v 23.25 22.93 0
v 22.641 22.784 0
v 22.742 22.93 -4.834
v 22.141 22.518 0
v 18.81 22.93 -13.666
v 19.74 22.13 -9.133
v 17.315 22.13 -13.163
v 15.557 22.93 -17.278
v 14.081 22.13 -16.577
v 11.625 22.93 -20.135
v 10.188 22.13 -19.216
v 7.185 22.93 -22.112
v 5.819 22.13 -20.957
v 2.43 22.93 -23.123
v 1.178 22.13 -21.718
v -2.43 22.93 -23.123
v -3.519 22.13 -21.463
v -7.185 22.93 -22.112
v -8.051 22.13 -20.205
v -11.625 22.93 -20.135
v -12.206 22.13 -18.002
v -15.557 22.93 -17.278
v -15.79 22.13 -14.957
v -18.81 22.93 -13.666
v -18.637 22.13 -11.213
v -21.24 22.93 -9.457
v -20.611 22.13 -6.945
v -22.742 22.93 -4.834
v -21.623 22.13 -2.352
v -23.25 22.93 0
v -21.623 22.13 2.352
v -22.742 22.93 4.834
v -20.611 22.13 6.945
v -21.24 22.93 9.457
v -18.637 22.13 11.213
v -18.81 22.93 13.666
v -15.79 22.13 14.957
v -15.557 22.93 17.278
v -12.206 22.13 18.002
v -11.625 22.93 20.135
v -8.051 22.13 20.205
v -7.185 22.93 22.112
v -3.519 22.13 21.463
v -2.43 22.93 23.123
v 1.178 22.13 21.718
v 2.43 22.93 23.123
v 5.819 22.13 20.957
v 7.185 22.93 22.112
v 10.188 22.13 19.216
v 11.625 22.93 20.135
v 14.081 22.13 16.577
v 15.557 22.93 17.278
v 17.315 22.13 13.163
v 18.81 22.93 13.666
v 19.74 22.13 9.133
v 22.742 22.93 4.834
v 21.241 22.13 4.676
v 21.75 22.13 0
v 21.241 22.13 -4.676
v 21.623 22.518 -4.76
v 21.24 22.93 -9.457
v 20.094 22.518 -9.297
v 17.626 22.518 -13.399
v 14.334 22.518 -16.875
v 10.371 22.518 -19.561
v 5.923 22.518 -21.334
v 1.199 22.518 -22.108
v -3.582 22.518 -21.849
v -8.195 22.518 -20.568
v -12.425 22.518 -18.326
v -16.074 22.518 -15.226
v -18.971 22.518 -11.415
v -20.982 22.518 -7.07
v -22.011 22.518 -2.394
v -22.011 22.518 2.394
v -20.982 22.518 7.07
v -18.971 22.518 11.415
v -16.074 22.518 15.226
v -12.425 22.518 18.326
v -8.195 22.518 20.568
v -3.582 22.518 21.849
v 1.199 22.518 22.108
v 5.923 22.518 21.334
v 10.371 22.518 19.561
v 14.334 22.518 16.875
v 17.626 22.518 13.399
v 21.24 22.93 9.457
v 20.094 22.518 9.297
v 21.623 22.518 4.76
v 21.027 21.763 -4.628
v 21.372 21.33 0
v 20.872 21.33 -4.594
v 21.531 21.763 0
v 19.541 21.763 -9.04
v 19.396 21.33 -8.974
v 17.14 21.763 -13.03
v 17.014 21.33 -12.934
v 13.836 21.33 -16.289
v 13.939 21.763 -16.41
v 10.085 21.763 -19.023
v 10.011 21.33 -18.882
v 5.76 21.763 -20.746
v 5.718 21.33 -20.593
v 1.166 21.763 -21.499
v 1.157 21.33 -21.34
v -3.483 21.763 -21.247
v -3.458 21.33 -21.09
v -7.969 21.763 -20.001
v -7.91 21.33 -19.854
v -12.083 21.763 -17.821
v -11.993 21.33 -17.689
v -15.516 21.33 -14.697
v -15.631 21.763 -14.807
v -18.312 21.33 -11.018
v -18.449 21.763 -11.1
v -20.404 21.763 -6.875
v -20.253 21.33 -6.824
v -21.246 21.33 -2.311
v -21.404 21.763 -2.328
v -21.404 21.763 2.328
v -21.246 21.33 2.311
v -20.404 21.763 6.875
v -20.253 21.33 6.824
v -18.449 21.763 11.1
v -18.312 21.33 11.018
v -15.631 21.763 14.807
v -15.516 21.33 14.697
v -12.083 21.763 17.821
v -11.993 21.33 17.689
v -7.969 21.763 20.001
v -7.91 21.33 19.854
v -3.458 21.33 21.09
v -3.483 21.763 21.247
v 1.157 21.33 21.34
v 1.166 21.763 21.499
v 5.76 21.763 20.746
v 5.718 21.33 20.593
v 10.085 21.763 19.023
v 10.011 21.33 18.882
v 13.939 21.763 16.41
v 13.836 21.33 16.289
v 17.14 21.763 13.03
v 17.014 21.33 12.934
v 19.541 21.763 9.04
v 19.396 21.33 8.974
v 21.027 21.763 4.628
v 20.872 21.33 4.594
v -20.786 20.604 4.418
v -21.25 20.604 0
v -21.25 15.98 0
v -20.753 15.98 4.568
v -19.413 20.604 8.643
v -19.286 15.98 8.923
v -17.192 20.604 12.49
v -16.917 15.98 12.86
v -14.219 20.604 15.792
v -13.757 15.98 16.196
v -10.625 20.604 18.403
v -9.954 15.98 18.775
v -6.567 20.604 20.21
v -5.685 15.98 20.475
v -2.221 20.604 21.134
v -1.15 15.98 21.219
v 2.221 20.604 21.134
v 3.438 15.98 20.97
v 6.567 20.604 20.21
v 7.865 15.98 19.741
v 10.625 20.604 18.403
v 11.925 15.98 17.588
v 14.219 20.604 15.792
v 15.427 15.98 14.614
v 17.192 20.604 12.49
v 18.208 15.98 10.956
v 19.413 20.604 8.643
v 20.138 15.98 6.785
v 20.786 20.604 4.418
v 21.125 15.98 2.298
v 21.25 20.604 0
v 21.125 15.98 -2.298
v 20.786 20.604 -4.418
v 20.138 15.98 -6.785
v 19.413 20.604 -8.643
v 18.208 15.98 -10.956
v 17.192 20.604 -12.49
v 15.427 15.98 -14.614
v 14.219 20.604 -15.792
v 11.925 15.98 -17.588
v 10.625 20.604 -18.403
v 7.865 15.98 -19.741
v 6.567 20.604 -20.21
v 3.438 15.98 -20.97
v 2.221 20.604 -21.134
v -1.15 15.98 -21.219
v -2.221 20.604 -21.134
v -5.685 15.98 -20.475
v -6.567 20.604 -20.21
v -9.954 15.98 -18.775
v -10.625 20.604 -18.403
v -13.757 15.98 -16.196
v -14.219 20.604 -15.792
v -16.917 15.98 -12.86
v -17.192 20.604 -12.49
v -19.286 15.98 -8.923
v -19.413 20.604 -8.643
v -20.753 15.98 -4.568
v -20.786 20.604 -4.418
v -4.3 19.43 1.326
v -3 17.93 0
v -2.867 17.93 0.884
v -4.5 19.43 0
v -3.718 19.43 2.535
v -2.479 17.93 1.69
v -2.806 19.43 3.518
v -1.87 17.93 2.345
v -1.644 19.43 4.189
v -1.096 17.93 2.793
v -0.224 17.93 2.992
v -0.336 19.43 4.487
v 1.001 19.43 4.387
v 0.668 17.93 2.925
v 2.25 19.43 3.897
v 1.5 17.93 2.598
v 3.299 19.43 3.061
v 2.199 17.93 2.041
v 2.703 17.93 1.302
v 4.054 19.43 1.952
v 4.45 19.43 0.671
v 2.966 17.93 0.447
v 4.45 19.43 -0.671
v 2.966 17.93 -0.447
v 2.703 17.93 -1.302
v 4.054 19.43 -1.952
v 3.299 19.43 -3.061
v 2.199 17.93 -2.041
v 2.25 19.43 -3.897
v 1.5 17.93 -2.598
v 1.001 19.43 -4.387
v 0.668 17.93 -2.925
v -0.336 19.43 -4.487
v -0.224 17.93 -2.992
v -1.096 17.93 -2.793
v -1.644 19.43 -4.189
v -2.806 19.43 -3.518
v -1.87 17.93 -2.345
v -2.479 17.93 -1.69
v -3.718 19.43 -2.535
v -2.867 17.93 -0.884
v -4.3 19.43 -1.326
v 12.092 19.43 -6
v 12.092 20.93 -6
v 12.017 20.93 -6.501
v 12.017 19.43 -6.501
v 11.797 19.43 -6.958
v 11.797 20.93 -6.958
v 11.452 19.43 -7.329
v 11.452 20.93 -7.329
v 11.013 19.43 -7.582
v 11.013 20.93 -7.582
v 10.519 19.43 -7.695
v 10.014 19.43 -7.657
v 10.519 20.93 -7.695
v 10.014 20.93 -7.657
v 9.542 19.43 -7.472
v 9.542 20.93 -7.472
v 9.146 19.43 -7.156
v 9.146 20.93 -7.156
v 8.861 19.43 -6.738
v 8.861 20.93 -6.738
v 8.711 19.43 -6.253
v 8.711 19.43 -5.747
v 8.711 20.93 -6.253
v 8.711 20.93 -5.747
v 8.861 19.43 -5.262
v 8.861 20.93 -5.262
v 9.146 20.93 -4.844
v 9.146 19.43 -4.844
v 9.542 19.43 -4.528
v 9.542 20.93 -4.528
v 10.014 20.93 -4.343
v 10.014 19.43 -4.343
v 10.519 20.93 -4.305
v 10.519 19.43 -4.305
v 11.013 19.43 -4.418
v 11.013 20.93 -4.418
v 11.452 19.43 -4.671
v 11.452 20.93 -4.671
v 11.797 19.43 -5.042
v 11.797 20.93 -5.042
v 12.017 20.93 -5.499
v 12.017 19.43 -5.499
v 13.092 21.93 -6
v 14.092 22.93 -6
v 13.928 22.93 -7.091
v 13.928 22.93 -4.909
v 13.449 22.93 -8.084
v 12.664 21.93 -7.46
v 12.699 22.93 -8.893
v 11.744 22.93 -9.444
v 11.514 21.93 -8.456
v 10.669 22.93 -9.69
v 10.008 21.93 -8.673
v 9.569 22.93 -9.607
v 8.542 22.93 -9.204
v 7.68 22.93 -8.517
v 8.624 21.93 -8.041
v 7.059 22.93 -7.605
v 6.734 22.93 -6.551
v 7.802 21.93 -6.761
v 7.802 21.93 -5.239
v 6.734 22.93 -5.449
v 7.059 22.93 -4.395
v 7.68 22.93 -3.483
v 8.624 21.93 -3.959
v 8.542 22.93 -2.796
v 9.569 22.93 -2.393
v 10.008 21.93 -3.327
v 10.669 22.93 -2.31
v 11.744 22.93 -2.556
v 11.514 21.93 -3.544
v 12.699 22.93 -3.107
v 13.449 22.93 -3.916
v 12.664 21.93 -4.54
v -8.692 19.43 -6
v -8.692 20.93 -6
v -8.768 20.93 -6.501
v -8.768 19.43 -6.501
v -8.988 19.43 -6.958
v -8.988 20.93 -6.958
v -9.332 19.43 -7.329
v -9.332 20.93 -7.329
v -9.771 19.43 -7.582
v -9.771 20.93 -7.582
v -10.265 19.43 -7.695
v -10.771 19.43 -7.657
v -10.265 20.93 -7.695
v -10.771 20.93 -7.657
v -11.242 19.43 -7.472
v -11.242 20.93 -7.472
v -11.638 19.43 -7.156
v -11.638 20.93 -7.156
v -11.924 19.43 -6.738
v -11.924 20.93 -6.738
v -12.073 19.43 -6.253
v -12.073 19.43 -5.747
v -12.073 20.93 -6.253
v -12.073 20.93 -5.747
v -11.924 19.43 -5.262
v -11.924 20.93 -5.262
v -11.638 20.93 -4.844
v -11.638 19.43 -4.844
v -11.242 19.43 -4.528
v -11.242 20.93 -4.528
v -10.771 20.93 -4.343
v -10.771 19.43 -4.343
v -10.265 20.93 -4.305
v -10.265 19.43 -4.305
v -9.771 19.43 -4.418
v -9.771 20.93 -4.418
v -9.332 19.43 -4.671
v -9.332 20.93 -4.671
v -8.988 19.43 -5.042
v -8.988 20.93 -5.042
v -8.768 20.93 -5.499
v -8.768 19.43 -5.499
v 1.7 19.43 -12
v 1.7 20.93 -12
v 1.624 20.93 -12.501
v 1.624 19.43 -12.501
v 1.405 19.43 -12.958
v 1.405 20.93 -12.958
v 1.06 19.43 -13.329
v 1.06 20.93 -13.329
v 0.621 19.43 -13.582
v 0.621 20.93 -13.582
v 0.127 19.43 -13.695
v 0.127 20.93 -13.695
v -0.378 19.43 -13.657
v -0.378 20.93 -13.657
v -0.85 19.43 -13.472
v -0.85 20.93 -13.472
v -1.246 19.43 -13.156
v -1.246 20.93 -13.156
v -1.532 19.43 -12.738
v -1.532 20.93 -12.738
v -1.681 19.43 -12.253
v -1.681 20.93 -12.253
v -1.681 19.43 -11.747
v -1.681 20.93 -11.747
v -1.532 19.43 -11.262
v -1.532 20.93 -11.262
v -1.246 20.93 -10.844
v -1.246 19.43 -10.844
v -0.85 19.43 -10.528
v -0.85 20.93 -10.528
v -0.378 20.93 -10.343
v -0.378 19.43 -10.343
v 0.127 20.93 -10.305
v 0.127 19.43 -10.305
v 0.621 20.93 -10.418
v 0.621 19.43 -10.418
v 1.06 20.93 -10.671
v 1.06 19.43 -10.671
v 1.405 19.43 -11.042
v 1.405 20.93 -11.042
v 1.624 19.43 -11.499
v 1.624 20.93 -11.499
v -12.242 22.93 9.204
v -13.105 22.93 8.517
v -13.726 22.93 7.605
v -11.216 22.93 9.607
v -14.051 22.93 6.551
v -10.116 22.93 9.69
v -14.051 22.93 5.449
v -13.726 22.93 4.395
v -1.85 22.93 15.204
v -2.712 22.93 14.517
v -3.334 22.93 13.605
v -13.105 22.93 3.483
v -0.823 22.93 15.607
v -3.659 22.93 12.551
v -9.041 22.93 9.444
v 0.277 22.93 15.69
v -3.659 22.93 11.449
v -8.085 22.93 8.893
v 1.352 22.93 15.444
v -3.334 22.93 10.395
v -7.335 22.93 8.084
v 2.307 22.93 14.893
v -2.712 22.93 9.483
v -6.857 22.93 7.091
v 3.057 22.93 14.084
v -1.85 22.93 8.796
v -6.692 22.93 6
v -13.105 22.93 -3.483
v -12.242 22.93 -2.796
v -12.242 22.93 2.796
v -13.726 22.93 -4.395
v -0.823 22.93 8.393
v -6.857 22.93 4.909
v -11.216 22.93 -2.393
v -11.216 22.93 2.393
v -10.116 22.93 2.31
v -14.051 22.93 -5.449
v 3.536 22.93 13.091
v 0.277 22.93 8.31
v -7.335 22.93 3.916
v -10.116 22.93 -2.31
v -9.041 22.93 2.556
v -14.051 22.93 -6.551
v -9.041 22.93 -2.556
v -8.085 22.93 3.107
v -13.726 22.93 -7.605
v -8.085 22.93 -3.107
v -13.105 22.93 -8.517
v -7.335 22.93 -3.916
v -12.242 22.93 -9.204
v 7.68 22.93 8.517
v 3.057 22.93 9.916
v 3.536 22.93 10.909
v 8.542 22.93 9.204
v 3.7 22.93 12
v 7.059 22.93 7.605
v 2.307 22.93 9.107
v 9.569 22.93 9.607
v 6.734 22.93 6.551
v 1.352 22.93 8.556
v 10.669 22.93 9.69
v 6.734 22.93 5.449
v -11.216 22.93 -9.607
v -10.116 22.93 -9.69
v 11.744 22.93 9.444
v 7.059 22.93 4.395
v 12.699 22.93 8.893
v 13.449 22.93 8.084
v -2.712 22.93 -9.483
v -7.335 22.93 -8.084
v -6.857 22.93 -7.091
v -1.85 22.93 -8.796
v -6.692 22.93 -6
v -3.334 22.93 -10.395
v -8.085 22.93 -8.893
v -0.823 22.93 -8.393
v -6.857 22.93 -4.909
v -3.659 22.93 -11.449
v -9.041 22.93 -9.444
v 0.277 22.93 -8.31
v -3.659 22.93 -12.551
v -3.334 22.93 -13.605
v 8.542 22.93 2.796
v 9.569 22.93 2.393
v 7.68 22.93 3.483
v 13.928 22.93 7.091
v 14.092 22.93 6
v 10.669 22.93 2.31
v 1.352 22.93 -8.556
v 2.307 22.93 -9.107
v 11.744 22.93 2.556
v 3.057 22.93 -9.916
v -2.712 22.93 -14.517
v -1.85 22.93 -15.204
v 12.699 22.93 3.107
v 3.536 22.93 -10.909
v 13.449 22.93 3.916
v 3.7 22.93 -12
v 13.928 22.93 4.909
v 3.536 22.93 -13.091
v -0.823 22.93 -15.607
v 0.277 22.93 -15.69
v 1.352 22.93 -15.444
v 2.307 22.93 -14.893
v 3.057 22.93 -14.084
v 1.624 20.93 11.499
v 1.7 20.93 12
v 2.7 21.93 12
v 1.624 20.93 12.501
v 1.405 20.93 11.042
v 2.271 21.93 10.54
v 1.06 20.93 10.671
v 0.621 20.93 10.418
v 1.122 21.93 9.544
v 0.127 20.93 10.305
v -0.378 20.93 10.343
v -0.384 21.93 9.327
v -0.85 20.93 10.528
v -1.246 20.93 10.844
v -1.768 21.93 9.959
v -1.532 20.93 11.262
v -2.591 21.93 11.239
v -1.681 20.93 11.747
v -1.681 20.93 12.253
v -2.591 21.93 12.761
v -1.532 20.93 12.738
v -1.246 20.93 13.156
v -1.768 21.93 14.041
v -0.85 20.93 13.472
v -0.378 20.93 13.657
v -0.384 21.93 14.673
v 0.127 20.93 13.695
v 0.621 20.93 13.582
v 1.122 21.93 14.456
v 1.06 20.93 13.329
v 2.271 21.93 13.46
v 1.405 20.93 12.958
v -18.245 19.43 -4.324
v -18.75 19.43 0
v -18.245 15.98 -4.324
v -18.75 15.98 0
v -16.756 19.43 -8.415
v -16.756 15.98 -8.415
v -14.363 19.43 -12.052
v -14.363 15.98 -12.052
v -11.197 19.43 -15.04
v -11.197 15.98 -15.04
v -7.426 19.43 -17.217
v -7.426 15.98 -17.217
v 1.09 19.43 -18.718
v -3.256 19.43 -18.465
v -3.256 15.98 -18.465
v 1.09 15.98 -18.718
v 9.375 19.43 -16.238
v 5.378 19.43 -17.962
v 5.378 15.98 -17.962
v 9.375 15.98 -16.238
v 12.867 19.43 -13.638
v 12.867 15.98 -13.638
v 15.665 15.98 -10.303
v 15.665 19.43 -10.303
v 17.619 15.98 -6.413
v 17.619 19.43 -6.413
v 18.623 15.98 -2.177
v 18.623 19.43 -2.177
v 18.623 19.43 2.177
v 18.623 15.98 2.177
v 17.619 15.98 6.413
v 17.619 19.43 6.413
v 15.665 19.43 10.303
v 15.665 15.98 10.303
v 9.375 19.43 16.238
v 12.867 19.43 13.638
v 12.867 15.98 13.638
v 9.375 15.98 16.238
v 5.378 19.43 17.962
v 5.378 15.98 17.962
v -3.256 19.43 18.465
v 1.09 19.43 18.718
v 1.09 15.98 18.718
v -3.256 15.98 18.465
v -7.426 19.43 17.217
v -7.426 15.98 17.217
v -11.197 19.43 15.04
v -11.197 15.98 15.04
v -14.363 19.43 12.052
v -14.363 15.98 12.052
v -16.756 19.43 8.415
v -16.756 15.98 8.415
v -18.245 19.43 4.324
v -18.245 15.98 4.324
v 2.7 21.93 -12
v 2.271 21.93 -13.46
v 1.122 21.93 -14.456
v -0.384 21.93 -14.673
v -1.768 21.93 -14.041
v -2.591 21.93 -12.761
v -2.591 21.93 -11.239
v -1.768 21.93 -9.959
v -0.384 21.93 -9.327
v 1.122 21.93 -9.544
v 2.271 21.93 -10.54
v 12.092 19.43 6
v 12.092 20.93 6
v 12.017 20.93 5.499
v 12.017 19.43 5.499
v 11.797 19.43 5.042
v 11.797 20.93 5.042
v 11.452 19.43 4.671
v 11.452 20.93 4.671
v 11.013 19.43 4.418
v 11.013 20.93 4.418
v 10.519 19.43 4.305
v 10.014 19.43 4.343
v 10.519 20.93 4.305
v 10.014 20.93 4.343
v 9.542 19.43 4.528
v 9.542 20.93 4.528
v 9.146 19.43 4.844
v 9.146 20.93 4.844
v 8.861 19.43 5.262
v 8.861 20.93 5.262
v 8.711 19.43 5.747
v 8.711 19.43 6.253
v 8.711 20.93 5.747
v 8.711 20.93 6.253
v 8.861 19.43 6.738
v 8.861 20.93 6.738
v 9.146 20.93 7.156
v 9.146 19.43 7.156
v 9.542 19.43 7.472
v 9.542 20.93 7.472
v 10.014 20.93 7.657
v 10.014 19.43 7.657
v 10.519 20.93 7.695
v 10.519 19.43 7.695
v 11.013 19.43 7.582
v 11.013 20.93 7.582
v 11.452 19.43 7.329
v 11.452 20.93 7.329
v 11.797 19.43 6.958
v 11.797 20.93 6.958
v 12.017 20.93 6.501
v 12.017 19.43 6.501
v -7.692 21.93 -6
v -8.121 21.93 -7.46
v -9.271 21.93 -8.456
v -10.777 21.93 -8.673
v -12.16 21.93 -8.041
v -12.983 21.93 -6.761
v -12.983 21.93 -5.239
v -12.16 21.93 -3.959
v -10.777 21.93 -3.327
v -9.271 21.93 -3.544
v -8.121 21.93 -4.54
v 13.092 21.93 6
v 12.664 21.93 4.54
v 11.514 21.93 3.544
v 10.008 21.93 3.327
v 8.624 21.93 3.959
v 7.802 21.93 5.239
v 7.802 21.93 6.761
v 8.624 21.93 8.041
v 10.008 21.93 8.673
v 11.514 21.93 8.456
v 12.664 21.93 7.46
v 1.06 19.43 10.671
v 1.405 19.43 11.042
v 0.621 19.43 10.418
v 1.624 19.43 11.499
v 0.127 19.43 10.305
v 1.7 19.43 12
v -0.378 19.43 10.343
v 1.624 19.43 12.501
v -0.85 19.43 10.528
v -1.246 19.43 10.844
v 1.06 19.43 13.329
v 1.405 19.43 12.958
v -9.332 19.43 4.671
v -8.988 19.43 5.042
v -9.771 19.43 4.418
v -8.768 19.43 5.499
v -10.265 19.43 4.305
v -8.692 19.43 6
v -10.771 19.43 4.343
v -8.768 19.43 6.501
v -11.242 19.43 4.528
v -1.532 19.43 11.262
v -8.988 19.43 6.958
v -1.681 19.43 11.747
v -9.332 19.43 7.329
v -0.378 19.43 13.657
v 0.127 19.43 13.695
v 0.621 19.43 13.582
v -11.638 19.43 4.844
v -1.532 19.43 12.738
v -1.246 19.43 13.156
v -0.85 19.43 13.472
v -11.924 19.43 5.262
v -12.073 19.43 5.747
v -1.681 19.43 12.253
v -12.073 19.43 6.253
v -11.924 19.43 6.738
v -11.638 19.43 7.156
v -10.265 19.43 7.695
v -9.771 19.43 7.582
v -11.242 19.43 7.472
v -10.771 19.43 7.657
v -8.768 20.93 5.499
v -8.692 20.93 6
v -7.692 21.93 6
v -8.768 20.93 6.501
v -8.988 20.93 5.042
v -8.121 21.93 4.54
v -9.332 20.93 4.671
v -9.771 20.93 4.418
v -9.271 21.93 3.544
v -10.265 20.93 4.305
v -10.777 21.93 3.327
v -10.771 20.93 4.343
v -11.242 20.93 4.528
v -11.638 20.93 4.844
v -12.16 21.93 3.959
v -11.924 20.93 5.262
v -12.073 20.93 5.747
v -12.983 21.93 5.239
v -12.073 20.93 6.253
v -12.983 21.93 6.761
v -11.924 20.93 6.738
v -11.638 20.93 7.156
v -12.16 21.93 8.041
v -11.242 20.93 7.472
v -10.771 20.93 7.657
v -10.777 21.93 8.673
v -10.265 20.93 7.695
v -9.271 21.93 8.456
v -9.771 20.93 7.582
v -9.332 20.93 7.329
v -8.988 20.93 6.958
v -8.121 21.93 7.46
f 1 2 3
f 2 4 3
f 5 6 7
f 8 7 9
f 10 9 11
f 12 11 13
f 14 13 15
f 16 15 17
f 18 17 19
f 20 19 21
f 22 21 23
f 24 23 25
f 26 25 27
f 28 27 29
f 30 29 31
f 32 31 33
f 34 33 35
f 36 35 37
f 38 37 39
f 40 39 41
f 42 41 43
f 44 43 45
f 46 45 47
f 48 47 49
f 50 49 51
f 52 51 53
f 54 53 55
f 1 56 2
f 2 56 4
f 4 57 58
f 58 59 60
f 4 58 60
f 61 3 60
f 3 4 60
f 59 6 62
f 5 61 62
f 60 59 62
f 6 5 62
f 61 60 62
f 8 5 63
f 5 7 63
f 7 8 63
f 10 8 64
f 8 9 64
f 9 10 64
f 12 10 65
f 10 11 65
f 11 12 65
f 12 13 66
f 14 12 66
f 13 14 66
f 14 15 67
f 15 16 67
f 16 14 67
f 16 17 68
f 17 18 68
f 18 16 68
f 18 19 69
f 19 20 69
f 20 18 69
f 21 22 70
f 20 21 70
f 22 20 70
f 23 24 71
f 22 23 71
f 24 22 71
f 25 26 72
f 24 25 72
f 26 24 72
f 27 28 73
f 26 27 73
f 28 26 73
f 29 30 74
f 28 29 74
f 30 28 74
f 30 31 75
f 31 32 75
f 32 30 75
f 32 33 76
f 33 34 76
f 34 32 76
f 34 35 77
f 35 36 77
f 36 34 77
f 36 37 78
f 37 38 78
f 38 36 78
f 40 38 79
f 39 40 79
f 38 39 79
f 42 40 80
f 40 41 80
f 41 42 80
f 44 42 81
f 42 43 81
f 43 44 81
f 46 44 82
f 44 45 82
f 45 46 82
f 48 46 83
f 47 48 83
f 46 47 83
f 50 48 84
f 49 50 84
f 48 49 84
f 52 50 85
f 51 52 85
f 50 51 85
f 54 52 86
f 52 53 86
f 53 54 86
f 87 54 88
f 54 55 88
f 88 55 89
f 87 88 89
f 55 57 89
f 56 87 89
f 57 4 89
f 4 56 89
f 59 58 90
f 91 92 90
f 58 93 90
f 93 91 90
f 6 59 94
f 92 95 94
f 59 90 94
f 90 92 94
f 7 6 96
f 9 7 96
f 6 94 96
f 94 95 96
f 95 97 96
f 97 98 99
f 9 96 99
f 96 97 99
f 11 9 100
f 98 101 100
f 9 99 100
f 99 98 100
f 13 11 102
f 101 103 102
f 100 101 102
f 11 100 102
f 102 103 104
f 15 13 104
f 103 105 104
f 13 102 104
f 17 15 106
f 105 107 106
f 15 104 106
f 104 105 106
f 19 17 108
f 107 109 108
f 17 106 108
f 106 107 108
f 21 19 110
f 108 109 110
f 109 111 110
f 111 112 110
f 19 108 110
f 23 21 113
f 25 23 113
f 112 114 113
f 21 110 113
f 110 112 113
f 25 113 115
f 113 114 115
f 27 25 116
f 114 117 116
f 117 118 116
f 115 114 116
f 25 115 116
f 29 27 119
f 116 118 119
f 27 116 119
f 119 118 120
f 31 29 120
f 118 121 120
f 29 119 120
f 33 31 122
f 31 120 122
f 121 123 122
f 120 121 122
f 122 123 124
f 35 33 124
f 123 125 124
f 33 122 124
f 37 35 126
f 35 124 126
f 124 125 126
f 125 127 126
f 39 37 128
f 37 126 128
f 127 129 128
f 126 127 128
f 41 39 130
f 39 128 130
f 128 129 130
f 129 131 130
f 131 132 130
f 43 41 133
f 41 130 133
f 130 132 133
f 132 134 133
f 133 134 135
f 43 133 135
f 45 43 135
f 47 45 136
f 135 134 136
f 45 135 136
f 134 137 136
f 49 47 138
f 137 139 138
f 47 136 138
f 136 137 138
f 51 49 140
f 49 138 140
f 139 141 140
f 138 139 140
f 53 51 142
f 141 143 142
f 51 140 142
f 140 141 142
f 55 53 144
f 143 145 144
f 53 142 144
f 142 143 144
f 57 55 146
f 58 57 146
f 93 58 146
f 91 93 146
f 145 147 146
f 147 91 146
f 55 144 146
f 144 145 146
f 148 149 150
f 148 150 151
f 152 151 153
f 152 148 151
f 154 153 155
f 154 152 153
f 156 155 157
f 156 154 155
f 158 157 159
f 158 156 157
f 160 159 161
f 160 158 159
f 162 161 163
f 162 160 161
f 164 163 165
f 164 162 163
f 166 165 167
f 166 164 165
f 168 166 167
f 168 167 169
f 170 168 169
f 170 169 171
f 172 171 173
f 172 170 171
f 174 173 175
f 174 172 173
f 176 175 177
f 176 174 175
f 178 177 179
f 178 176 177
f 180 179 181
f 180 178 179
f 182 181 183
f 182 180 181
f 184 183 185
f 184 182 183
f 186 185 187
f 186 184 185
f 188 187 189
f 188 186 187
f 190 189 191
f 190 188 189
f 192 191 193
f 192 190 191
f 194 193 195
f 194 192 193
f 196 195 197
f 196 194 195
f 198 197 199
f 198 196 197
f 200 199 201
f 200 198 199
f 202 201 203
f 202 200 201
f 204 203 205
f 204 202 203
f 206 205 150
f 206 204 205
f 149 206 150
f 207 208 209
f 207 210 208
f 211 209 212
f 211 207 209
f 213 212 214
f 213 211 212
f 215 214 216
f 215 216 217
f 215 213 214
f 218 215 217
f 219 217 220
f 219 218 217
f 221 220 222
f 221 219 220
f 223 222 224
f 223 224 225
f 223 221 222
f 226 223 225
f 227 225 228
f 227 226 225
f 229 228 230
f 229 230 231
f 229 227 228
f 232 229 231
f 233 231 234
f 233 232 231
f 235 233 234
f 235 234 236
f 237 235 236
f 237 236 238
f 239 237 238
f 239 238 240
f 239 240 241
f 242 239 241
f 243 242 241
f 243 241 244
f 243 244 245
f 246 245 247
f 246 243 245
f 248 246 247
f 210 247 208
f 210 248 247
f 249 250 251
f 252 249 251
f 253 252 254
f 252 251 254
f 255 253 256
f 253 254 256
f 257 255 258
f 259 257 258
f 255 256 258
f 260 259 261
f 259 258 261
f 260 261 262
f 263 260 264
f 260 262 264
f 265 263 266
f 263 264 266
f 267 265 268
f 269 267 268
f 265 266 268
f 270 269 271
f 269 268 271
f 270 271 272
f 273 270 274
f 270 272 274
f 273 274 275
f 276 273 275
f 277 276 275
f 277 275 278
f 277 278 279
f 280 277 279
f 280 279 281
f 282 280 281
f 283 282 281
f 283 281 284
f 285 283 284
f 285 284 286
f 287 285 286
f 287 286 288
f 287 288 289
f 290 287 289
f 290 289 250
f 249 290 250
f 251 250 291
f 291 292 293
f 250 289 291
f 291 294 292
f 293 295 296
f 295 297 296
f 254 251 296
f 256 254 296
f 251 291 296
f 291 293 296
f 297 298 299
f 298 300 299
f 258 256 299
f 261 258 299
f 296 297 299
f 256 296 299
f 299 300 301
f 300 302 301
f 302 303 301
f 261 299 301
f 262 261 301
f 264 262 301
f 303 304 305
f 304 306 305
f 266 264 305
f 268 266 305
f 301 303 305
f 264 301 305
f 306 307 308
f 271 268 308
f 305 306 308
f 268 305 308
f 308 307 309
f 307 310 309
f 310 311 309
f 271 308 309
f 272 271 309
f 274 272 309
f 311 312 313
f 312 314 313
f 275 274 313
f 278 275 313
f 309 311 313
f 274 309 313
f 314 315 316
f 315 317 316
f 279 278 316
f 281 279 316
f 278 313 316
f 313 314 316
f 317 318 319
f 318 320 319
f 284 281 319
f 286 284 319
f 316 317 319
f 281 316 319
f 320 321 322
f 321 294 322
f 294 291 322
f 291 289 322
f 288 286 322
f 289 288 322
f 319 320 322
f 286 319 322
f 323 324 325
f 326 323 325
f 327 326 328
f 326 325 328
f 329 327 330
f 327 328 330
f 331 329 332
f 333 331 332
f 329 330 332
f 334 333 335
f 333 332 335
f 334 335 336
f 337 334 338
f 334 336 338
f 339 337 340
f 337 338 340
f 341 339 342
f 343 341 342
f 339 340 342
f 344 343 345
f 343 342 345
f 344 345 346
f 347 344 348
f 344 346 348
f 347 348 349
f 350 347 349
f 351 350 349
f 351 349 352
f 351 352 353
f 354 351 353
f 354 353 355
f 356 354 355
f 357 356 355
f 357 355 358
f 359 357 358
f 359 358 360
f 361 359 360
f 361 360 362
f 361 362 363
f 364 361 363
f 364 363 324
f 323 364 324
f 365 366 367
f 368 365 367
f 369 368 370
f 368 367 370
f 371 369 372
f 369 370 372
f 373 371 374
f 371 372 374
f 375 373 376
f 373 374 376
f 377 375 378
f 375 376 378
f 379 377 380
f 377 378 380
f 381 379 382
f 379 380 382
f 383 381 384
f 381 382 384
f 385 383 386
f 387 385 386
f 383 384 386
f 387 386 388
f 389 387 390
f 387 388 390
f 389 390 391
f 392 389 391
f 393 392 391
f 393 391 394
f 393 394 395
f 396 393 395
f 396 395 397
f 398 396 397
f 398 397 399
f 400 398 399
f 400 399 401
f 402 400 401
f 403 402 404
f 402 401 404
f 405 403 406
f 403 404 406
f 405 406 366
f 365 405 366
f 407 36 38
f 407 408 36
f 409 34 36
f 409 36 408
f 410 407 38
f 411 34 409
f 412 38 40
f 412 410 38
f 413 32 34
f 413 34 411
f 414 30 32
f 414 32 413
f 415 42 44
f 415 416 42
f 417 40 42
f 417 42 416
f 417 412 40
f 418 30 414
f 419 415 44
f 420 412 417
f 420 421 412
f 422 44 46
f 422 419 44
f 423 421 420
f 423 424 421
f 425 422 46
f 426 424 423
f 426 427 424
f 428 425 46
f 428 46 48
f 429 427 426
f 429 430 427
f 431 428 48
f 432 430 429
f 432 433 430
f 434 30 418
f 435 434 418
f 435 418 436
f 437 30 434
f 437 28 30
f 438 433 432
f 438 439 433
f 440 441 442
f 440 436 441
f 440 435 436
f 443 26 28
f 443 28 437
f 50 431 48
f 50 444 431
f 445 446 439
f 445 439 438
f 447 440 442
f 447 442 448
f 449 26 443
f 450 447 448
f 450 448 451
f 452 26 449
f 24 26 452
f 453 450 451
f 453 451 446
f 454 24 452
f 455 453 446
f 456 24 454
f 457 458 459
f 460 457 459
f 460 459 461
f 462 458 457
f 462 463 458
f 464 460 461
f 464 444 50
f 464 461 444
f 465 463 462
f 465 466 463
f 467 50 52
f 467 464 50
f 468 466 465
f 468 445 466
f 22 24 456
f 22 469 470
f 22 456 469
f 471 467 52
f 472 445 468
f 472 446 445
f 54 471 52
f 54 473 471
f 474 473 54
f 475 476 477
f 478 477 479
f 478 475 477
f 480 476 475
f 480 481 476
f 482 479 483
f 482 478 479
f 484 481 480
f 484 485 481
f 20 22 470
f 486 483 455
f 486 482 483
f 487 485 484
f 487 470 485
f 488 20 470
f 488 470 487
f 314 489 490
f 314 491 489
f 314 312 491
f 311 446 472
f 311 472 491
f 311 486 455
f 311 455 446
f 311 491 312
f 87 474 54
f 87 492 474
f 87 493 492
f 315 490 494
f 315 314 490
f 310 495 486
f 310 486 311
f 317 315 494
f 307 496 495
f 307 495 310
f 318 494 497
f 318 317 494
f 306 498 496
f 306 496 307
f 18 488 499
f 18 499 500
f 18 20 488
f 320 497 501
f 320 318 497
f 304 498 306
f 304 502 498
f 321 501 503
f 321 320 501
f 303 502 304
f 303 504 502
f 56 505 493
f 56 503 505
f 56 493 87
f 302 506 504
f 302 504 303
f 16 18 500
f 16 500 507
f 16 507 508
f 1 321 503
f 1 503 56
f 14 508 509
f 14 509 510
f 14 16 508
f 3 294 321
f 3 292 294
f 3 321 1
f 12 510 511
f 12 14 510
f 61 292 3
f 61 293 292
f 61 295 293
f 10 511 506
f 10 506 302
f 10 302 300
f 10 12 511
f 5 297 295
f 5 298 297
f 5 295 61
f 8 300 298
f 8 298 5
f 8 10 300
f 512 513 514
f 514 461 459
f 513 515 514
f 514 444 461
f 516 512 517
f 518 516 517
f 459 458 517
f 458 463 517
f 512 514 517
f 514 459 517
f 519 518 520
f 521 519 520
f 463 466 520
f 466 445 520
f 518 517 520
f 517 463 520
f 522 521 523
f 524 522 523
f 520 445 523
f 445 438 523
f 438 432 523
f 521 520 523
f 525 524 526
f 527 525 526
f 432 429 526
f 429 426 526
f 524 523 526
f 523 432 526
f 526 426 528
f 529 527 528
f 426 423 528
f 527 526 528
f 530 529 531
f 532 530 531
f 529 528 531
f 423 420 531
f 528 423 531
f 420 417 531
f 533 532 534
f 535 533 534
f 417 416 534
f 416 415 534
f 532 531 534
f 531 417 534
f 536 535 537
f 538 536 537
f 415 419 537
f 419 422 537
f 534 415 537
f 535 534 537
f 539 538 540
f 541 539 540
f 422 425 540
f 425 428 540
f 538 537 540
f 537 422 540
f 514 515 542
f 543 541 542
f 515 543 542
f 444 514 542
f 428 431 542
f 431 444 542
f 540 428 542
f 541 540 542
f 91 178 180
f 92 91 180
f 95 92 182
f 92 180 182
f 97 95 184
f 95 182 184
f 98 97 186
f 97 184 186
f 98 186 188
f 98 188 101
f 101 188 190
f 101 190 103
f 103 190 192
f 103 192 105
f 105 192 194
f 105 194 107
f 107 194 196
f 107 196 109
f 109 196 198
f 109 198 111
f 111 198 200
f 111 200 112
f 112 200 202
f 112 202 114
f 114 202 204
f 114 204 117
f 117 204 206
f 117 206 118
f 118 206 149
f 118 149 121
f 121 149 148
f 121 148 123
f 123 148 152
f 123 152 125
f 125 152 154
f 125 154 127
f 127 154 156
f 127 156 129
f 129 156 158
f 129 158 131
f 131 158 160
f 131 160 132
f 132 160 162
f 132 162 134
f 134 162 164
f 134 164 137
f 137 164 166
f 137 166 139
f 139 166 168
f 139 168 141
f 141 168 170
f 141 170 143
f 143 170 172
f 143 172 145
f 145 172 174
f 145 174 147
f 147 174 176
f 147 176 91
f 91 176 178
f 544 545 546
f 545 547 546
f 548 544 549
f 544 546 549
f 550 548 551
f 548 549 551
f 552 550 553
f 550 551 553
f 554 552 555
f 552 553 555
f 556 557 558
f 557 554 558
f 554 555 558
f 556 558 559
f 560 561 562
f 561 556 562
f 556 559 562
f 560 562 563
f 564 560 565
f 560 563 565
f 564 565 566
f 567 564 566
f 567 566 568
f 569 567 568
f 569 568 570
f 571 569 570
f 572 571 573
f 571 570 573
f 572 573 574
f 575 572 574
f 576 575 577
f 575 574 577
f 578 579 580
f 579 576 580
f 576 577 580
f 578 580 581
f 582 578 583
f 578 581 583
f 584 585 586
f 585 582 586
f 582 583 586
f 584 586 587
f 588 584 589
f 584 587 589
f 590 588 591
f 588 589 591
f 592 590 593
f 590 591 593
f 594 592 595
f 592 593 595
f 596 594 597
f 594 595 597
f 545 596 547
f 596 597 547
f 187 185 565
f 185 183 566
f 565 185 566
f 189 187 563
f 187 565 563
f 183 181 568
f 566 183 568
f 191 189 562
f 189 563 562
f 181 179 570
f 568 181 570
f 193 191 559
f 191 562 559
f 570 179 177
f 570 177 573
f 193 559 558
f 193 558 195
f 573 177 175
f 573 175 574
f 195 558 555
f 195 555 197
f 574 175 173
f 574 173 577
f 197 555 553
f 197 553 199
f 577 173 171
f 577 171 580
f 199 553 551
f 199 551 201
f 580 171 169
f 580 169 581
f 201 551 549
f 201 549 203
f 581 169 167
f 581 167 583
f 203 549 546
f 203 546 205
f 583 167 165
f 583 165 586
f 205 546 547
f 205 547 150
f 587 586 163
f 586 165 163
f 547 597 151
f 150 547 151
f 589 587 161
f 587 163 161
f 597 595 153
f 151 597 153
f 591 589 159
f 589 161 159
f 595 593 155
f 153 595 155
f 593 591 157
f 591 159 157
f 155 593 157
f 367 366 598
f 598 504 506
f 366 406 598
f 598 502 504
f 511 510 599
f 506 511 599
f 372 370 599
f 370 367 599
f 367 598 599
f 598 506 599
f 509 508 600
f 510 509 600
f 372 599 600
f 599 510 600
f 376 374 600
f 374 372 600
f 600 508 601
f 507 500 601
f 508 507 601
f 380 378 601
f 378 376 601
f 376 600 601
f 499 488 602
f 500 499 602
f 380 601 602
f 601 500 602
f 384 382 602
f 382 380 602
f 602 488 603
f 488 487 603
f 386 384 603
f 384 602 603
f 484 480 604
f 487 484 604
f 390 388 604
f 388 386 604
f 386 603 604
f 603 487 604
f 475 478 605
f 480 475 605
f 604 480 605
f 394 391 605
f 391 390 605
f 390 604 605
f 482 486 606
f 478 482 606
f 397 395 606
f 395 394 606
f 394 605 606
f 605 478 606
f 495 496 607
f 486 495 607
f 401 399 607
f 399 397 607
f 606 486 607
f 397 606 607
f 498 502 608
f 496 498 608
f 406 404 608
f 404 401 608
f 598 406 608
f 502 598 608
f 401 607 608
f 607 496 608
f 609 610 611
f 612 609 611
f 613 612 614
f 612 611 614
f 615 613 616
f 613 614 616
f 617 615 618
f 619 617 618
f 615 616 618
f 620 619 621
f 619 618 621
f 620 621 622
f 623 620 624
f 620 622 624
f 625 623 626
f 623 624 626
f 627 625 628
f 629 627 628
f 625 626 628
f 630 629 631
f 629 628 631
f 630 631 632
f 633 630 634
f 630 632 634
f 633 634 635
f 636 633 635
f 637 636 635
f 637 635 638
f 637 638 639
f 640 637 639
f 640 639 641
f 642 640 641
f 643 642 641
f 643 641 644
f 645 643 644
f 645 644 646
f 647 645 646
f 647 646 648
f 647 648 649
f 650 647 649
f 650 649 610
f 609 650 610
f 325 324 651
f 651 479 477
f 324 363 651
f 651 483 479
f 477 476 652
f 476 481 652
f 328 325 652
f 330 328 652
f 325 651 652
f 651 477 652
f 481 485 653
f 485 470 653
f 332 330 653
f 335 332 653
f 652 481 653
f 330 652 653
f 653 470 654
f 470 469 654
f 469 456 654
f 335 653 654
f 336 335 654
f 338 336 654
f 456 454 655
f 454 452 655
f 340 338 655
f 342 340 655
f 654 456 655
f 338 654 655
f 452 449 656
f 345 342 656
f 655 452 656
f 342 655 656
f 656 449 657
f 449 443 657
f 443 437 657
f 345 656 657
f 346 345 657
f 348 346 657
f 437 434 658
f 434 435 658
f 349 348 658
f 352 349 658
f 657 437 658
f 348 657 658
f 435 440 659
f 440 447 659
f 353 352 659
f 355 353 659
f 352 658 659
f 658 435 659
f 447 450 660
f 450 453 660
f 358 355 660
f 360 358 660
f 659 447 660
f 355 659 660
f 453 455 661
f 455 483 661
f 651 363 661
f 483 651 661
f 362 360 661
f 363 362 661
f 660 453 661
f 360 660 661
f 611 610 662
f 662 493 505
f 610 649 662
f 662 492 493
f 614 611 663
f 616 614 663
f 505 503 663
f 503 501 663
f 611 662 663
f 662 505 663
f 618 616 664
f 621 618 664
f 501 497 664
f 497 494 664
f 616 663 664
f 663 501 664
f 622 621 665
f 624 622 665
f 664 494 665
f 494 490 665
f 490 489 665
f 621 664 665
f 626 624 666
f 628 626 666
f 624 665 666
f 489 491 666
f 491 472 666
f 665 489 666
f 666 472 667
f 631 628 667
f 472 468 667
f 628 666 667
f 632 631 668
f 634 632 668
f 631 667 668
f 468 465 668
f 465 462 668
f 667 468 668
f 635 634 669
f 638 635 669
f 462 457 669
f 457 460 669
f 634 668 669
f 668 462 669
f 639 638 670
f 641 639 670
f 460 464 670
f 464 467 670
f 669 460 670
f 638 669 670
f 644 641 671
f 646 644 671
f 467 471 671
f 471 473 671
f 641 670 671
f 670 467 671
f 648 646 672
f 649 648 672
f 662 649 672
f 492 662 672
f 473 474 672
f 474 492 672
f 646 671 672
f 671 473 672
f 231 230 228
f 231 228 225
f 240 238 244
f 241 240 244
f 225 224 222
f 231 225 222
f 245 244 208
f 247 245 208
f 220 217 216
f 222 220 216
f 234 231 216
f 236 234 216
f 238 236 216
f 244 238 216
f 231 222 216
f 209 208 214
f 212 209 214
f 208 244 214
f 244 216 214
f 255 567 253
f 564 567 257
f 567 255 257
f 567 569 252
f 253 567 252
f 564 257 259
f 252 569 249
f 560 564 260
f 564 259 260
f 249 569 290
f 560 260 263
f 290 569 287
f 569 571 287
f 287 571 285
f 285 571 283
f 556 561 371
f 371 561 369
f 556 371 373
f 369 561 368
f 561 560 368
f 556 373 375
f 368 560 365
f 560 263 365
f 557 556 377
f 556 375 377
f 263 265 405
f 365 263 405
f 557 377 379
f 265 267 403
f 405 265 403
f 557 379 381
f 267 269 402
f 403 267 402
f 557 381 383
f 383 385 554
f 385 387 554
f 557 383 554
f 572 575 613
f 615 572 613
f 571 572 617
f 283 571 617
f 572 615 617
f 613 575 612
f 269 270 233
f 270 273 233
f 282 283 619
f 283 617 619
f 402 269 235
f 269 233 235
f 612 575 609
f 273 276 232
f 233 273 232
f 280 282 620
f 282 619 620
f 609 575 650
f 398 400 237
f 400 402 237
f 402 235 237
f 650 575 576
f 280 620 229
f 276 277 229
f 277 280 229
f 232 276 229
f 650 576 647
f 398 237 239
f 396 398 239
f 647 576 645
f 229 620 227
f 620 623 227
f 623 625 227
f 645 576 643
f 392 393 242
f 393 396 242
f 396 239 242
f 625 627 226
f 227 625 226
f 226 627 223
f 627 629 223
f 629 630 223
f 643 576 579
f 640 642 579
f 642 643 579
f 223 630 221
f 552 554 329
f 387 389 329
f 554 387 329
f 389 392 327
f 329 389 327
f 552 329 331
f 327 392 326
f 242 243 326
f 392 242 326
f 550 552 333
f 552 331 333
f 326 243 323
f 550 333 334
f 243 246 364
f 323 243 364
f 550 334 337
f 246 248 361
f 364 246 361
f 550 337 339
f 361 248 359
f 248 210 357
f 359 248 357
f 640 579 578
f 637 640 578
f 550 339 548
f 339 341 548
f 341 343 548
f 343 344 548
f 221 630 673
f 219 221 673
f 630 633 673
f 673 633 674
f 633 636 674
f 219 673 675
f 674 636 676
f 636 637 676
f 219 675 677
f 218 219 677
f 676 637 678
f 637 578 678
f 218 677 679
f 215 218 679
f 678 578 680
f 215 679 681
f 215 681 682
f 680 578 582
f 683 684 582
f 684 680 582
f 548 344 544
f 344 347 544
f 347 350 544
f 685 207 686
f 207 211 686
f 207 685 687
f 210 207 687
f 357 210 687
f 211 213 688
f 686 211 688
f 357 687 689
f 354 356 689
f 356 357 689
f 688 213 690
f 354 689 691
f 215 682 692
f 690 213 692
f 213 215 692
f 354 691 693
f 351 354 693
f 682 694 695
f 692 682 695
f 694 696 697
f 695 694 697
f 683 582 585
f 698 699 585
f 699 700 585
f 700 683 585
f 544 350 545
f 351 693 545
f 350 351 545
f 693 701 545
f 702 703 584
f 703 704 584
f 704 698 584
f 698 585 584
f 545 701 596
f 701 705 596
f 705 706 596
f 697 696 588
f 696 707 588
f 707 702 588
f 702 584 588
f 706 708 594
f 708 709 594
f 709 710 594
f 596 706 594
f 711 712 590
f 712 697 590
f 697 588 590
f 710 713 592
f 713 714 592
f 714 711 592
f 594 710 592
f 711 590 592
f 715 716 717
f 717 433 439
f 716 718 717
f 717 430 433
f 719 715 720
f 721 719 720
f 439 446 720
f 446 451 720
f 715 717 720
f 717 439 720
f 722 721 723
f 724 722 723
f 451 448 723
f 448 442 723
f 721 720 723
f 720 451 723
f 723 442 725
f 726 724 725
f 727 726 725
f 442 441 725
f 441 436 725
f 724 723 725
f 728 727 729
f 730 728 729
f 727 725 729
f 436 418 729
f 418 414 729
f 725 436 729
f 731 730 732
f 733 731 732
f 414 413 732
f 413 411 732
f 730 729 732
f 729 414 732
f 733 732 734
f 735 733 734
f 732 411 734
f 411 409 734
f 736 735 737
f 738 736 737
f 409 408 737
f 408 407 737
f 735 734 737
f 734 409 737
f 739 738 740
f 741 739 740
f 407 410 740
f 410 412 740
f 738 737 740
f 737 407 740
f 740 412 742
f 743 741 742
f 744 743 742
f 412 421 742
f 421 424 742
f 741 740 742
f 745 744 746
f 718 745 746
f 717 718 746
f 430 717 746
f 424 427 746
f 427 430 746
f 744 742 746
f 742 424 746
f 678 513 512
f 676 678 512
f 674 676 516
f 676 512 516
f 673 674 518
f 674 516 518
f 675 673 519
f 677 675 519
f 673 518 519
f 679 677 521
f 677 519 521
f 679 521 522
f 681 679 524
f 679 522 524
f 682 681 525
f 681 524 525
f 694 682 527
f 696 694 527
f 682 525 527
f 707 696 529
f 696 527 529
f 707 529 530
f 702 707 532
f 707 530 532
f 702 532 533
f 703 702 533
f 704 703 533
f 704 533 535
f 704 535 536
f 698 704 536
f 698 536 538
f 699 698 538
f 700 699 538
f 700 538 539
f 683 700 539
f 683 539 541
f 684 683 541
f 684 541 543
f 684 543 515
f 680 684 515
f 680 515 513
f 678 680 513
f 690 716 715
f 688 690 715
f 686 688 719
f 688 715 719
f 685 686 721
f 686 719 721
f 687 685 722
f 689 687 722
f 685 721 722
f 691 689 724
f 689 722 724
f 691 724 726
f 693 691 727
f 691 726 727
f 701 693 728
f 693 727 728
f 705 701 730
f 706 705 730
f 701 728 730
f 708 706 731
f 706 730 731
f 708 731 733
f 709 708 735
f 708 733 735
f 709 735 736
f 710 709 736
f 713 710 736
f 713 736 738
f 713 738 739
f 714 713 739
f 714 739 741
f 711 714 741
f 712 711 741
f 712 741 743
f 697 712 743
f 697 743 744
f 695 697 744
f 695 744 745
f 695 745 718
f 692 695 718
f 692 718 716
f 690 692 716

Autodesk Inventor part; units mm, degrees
ref_plane "YZ Plane" through (0, 0, 0) normal (1, 0, 0) x (0, 1, 0)
ref_plane "XZ Plane" through (0, 0, 0) normal (0, 1, 0) x (-1, 0, 0)
ref_plane "XY Plane" through (0, 0, 0) normal (0, 0, 1) x (1, 0, 0)
sketch "Эскиз1" plane through (0, 0, 0) normal (0, 0, 1) x (1, 0, 0)
  line L0 (-21.25, 15.93) -> (21.25, 15.93) projected
  line L1 (-16.25, 17.93) -> (-18.25, 15.93)
  line L2 (-16.25, 17.93) -> (16.25, 17.93) projected
  line L3 (16.25, 17.93) -> (18.25, 15.93)
  line L4 (-26.02, 3) -> (26.02, 3) projected
  line L5 (-21.25, 15.93) -> (-21.25, 5)
  line L6 (30, 22.93) -> (-30, 22.93) projected
  line L7 (-25.52, 22.93) -> (-25.52, 3)
  line L8 (-18.25, 15.93) -> (-18.75, 15.93)
  line L9 (0, 17.93) -> (0, 19.43)
  line L10 (-18.75, 15.93) -> (-14.5074, 15.93) construction
  line L11 (-21.25, 15.93) -> (-21.25, 22.93)
  line L12 (-21.25, 22.93) -> (0, 22.93)
  line L13 (0, 17.93) -> (0, 22.93)
  line L14 (-21.25, 15.98) -> (21.25, 15.98)
  line L15 (-18.75, 15.93) -> (-11.809, 15.93) construction
  line L16 (0, 19.43) -> (-15.25, 19.43)
  line L17 (-15.25, 19.43) -> (-18.75, 15.93)
  line L18 (-15.25, 19.43) -> (-18.75, 19.43)
  line L19 (-18.75, 19.43) -> (-18.75, 15.93)
  line L20 (21.25, 15.98) -> (21.25, 22.93)
  line L21 (0, 22.93) -> (21.25, 22.93)
  line L22 (21.75, 21.33) -> (21.75, 22.93)
  line L23 (22.25, 21.33) -> (21.25, 21.33)
  line L24 (23.25, 22.93) -> (21.25, 19.73)
  spline S0 degree 2 poles (23.25, 22.93) (21.0575, 22.6489) (21.25, 19.73) knots 0 0 0 1 1 1
  line L25 (23.25, 22.93) -> (21.25, 22.93)
  line L26 (23.25, 19.73) -> (21.25, 19.73)
  line L27 (22.25, 21.33) -> (21.25, 21.33)
  line L28 (21.75, 21.33) -> (21.75, 22.93)
  line L29 (23.25, 22.93) -> (21.25, 22.93)
  line L30 (23.25, 22.93) -> (21.25, 19.73)
  spline S1 degree 2 poles (23.25, 22.93) (21.0575, 22.6489) (21.25, 19.73) knots 0 0 0 1 1 1
  line L31 (0, 17.93) -> (-3, 17.93)
  line L32 (-3, 17.93) -> (-4.5, 19.43)
  point P0 (-18.7, 15.98)
  point P1 (-18.75, 15.98)
  point P2 (21.75, 22.13)
  point P3 (22.7031, 19.73)
  point P4 (21.75, 22.13)
  point P5 (21.25, 20.6035)
  dimension "d0" = 0.5
  dimension "d1" = 1.5
  dimension "d3" = 0.05
  dimension "d28" = 3
revolve "Вращение1" add sketch "Эскиз1" angle 360 about axis through (0, 17.93, 0) along (0, 1, 0) contours L11 L6 L13 L16 L18 L19 L14 | L16 L9 L2 L32 | L6 L22 S0 L23 L20 | L6 S0 L22 | L23 S0 L20
sketch "Эскиз3" plane through (0, 22.93, 0) normal (0, 1, 0) x (1, 0, 0)
  circle A0 centre (0, 0) radius 1.7
  line L0 (0, 0) -> (0, 12)
  circle A1 centre (0, 0) radius 21.25 projected
  circle A2 centre (0, 0) radius 15.75 projected
  circle A3 centre (0, 12) radius 1.7
  circle A4 centre (-10.3923, 6) radius 1.7
  circle A5 centre (-10.3923, -6) radius 1.7
  circle A6 centre (0, -12) radius 1.7
  circle A7 centre (10.3923, -6) radius 1.7
  circle A8 centre (10.3923, 6) radius 1.7
  point P0 (-21.25, 0)
  dimension "d7" = 3.4
  dimension "d8" = 12
  dimension "d9" = 3.4
  dimension "d12" = 360
extrude "Выдавливание1" cut sketch "Эскиз3" against normal blind 10 contours A3 | A4 | A5 | A6 | A7 | A8
sketch "Эскиз4" plane through (0, 22.93, 0) normal (0, 1, 0) x (1, 0, 0)
  line L0 (0, 0) -> (0, 2.85)
  circle A0 centre (0, 12) radius 1.7 projected
  line L1 (0, 12) -> (0, 9.15)
  line L2 (1.6454, 2.85) -> (3.2909, 0)
  line L3 (3.2909, 0) -> (1.6454, -2.85)
  line L4 (1.6454, -2.85) -> (-1.6454, -2.85)
  line L5 (-1.6454, -2.85) -> (-3.2909, 0)
  line L6 (-3.2909, 0) -> (-1.6454, 2.85)
  line L7 (-1.6454, 2.85) -> (1.6454, 2.85)
  line L8 (-1.6454, 9.15) -> (-3.2909, 12)
  line L9 (-3.2909, 12) -> (-1.6454, 14.85)
  line L10 (-1.6454, 14.85) -> (1.6454, 14.85)
  line L11 (1.6454, 14.85) -> (3.2909, 12)
  line L12 (3.2909, 12) -> (1.6454, 9.15)
  line L13 (1.6454, 9.15) -> (-1.6454, 9.15)
  line L14 (8.7469, 3.15) -> (7.1014, 6)
  line L15 (10.3923, 6) -> (7.9241, 4.575)
  line L16 (12.0378, 3.15) -> (8.7469, 3.15)
  line L17 (13.6832, 6) -> (12.0378, 3.15)
  line L18 (12.0378, 8.85) -> (13.6832, 6)
  line L19 (8.7469, 8.85) -> (12.0378, 8.85)
  line L20 (7.1014, 6) -> (8.7469, 8.85)
  line L21 (7.1014, -6) -> (8.7469, -3.15)
  line L22 (10.3923, -6) -> (7.9241, -4.575)
  line L23 (8.7469, -8.85) -> (7.1014, -6)
  line L24 (12.0378, -8.85) -> (8.7469, -8.85)
  line L25 (13.6832, -6) -> (12.0378, -8.85)
  line L26 (12.0378, -3.15) -> (13.6832, -6)
  line L27 (8.7469, -3.15) -> (12.0378, -3.15)
  line L28 (-1.6454, -9.15) -> (1.6454, -9.15)
  line L29 (0, -12) -> (0, -9.15)
  line L30 (-3.2909, -12) -> (-1.6454, -9.15)
  line L31 (-1.6454, -14.85) -> (-3.2909, -12)
  line L32 (1.6454, -14.85) -> (-1.6454, -14.85)
  line L33 (3.2909, -12) -> (1.6454, -14.85)
  line L34 (1.6454, -9.15) -> (3.2909, -12)
  line L35 (-8.7469, -3.15) -> (-7.1014, -6)
  line L36 (-10.3923, -6) -> (-7.9241, -4.575)
  line L37 (-12.0378, -3.15) -> (-8.7469, -3.15)
  line L38 (-13.6832, -6) -> (-12.0378, -3.15)
  line L39 (-12.0378, -8.85) -> (-13.6832, -6)
  line L40 (-8.7469, -8.85) -> (-12.0378, -8.85)
  line L41 (-7.1014, -6) -> (-8.7469, -8.85)
  line L42 (-7.1014, 6) -> (-8.7469, 3.15)
  line L43 (-10.3923, 6) -> (-7.9241, 4.575)
  line L44 (-8.7469, 8.85) -> (-7.1014, 6)
  line L45 (-12.0378, 8.85) -> (-8.7469, 8.85)
  line L46 (-13.6832, 6) -> (-12.0378, 8.85)
  line L47 (-12.0378, 3.15) -> (-13.6832, 6)
  line L48 (-8.7469, 3.15) -> (-12.0378, 3.15)
  dimension "d16" = 2.85
  dimension "d17" = 2.85
  dimension "d20" = 360
chamfer "Фаска1" distance 2 angle 45 6 edges at (-12.0923, 22.93, -6) (-12.0923, 22.93, 6) (-1.7, 22.93, -12) (8.6923, 22.93, -6) (8.6923, 22.93, 6) (-1.7, 22.93, 12)
properties part number "tire_cap2"
